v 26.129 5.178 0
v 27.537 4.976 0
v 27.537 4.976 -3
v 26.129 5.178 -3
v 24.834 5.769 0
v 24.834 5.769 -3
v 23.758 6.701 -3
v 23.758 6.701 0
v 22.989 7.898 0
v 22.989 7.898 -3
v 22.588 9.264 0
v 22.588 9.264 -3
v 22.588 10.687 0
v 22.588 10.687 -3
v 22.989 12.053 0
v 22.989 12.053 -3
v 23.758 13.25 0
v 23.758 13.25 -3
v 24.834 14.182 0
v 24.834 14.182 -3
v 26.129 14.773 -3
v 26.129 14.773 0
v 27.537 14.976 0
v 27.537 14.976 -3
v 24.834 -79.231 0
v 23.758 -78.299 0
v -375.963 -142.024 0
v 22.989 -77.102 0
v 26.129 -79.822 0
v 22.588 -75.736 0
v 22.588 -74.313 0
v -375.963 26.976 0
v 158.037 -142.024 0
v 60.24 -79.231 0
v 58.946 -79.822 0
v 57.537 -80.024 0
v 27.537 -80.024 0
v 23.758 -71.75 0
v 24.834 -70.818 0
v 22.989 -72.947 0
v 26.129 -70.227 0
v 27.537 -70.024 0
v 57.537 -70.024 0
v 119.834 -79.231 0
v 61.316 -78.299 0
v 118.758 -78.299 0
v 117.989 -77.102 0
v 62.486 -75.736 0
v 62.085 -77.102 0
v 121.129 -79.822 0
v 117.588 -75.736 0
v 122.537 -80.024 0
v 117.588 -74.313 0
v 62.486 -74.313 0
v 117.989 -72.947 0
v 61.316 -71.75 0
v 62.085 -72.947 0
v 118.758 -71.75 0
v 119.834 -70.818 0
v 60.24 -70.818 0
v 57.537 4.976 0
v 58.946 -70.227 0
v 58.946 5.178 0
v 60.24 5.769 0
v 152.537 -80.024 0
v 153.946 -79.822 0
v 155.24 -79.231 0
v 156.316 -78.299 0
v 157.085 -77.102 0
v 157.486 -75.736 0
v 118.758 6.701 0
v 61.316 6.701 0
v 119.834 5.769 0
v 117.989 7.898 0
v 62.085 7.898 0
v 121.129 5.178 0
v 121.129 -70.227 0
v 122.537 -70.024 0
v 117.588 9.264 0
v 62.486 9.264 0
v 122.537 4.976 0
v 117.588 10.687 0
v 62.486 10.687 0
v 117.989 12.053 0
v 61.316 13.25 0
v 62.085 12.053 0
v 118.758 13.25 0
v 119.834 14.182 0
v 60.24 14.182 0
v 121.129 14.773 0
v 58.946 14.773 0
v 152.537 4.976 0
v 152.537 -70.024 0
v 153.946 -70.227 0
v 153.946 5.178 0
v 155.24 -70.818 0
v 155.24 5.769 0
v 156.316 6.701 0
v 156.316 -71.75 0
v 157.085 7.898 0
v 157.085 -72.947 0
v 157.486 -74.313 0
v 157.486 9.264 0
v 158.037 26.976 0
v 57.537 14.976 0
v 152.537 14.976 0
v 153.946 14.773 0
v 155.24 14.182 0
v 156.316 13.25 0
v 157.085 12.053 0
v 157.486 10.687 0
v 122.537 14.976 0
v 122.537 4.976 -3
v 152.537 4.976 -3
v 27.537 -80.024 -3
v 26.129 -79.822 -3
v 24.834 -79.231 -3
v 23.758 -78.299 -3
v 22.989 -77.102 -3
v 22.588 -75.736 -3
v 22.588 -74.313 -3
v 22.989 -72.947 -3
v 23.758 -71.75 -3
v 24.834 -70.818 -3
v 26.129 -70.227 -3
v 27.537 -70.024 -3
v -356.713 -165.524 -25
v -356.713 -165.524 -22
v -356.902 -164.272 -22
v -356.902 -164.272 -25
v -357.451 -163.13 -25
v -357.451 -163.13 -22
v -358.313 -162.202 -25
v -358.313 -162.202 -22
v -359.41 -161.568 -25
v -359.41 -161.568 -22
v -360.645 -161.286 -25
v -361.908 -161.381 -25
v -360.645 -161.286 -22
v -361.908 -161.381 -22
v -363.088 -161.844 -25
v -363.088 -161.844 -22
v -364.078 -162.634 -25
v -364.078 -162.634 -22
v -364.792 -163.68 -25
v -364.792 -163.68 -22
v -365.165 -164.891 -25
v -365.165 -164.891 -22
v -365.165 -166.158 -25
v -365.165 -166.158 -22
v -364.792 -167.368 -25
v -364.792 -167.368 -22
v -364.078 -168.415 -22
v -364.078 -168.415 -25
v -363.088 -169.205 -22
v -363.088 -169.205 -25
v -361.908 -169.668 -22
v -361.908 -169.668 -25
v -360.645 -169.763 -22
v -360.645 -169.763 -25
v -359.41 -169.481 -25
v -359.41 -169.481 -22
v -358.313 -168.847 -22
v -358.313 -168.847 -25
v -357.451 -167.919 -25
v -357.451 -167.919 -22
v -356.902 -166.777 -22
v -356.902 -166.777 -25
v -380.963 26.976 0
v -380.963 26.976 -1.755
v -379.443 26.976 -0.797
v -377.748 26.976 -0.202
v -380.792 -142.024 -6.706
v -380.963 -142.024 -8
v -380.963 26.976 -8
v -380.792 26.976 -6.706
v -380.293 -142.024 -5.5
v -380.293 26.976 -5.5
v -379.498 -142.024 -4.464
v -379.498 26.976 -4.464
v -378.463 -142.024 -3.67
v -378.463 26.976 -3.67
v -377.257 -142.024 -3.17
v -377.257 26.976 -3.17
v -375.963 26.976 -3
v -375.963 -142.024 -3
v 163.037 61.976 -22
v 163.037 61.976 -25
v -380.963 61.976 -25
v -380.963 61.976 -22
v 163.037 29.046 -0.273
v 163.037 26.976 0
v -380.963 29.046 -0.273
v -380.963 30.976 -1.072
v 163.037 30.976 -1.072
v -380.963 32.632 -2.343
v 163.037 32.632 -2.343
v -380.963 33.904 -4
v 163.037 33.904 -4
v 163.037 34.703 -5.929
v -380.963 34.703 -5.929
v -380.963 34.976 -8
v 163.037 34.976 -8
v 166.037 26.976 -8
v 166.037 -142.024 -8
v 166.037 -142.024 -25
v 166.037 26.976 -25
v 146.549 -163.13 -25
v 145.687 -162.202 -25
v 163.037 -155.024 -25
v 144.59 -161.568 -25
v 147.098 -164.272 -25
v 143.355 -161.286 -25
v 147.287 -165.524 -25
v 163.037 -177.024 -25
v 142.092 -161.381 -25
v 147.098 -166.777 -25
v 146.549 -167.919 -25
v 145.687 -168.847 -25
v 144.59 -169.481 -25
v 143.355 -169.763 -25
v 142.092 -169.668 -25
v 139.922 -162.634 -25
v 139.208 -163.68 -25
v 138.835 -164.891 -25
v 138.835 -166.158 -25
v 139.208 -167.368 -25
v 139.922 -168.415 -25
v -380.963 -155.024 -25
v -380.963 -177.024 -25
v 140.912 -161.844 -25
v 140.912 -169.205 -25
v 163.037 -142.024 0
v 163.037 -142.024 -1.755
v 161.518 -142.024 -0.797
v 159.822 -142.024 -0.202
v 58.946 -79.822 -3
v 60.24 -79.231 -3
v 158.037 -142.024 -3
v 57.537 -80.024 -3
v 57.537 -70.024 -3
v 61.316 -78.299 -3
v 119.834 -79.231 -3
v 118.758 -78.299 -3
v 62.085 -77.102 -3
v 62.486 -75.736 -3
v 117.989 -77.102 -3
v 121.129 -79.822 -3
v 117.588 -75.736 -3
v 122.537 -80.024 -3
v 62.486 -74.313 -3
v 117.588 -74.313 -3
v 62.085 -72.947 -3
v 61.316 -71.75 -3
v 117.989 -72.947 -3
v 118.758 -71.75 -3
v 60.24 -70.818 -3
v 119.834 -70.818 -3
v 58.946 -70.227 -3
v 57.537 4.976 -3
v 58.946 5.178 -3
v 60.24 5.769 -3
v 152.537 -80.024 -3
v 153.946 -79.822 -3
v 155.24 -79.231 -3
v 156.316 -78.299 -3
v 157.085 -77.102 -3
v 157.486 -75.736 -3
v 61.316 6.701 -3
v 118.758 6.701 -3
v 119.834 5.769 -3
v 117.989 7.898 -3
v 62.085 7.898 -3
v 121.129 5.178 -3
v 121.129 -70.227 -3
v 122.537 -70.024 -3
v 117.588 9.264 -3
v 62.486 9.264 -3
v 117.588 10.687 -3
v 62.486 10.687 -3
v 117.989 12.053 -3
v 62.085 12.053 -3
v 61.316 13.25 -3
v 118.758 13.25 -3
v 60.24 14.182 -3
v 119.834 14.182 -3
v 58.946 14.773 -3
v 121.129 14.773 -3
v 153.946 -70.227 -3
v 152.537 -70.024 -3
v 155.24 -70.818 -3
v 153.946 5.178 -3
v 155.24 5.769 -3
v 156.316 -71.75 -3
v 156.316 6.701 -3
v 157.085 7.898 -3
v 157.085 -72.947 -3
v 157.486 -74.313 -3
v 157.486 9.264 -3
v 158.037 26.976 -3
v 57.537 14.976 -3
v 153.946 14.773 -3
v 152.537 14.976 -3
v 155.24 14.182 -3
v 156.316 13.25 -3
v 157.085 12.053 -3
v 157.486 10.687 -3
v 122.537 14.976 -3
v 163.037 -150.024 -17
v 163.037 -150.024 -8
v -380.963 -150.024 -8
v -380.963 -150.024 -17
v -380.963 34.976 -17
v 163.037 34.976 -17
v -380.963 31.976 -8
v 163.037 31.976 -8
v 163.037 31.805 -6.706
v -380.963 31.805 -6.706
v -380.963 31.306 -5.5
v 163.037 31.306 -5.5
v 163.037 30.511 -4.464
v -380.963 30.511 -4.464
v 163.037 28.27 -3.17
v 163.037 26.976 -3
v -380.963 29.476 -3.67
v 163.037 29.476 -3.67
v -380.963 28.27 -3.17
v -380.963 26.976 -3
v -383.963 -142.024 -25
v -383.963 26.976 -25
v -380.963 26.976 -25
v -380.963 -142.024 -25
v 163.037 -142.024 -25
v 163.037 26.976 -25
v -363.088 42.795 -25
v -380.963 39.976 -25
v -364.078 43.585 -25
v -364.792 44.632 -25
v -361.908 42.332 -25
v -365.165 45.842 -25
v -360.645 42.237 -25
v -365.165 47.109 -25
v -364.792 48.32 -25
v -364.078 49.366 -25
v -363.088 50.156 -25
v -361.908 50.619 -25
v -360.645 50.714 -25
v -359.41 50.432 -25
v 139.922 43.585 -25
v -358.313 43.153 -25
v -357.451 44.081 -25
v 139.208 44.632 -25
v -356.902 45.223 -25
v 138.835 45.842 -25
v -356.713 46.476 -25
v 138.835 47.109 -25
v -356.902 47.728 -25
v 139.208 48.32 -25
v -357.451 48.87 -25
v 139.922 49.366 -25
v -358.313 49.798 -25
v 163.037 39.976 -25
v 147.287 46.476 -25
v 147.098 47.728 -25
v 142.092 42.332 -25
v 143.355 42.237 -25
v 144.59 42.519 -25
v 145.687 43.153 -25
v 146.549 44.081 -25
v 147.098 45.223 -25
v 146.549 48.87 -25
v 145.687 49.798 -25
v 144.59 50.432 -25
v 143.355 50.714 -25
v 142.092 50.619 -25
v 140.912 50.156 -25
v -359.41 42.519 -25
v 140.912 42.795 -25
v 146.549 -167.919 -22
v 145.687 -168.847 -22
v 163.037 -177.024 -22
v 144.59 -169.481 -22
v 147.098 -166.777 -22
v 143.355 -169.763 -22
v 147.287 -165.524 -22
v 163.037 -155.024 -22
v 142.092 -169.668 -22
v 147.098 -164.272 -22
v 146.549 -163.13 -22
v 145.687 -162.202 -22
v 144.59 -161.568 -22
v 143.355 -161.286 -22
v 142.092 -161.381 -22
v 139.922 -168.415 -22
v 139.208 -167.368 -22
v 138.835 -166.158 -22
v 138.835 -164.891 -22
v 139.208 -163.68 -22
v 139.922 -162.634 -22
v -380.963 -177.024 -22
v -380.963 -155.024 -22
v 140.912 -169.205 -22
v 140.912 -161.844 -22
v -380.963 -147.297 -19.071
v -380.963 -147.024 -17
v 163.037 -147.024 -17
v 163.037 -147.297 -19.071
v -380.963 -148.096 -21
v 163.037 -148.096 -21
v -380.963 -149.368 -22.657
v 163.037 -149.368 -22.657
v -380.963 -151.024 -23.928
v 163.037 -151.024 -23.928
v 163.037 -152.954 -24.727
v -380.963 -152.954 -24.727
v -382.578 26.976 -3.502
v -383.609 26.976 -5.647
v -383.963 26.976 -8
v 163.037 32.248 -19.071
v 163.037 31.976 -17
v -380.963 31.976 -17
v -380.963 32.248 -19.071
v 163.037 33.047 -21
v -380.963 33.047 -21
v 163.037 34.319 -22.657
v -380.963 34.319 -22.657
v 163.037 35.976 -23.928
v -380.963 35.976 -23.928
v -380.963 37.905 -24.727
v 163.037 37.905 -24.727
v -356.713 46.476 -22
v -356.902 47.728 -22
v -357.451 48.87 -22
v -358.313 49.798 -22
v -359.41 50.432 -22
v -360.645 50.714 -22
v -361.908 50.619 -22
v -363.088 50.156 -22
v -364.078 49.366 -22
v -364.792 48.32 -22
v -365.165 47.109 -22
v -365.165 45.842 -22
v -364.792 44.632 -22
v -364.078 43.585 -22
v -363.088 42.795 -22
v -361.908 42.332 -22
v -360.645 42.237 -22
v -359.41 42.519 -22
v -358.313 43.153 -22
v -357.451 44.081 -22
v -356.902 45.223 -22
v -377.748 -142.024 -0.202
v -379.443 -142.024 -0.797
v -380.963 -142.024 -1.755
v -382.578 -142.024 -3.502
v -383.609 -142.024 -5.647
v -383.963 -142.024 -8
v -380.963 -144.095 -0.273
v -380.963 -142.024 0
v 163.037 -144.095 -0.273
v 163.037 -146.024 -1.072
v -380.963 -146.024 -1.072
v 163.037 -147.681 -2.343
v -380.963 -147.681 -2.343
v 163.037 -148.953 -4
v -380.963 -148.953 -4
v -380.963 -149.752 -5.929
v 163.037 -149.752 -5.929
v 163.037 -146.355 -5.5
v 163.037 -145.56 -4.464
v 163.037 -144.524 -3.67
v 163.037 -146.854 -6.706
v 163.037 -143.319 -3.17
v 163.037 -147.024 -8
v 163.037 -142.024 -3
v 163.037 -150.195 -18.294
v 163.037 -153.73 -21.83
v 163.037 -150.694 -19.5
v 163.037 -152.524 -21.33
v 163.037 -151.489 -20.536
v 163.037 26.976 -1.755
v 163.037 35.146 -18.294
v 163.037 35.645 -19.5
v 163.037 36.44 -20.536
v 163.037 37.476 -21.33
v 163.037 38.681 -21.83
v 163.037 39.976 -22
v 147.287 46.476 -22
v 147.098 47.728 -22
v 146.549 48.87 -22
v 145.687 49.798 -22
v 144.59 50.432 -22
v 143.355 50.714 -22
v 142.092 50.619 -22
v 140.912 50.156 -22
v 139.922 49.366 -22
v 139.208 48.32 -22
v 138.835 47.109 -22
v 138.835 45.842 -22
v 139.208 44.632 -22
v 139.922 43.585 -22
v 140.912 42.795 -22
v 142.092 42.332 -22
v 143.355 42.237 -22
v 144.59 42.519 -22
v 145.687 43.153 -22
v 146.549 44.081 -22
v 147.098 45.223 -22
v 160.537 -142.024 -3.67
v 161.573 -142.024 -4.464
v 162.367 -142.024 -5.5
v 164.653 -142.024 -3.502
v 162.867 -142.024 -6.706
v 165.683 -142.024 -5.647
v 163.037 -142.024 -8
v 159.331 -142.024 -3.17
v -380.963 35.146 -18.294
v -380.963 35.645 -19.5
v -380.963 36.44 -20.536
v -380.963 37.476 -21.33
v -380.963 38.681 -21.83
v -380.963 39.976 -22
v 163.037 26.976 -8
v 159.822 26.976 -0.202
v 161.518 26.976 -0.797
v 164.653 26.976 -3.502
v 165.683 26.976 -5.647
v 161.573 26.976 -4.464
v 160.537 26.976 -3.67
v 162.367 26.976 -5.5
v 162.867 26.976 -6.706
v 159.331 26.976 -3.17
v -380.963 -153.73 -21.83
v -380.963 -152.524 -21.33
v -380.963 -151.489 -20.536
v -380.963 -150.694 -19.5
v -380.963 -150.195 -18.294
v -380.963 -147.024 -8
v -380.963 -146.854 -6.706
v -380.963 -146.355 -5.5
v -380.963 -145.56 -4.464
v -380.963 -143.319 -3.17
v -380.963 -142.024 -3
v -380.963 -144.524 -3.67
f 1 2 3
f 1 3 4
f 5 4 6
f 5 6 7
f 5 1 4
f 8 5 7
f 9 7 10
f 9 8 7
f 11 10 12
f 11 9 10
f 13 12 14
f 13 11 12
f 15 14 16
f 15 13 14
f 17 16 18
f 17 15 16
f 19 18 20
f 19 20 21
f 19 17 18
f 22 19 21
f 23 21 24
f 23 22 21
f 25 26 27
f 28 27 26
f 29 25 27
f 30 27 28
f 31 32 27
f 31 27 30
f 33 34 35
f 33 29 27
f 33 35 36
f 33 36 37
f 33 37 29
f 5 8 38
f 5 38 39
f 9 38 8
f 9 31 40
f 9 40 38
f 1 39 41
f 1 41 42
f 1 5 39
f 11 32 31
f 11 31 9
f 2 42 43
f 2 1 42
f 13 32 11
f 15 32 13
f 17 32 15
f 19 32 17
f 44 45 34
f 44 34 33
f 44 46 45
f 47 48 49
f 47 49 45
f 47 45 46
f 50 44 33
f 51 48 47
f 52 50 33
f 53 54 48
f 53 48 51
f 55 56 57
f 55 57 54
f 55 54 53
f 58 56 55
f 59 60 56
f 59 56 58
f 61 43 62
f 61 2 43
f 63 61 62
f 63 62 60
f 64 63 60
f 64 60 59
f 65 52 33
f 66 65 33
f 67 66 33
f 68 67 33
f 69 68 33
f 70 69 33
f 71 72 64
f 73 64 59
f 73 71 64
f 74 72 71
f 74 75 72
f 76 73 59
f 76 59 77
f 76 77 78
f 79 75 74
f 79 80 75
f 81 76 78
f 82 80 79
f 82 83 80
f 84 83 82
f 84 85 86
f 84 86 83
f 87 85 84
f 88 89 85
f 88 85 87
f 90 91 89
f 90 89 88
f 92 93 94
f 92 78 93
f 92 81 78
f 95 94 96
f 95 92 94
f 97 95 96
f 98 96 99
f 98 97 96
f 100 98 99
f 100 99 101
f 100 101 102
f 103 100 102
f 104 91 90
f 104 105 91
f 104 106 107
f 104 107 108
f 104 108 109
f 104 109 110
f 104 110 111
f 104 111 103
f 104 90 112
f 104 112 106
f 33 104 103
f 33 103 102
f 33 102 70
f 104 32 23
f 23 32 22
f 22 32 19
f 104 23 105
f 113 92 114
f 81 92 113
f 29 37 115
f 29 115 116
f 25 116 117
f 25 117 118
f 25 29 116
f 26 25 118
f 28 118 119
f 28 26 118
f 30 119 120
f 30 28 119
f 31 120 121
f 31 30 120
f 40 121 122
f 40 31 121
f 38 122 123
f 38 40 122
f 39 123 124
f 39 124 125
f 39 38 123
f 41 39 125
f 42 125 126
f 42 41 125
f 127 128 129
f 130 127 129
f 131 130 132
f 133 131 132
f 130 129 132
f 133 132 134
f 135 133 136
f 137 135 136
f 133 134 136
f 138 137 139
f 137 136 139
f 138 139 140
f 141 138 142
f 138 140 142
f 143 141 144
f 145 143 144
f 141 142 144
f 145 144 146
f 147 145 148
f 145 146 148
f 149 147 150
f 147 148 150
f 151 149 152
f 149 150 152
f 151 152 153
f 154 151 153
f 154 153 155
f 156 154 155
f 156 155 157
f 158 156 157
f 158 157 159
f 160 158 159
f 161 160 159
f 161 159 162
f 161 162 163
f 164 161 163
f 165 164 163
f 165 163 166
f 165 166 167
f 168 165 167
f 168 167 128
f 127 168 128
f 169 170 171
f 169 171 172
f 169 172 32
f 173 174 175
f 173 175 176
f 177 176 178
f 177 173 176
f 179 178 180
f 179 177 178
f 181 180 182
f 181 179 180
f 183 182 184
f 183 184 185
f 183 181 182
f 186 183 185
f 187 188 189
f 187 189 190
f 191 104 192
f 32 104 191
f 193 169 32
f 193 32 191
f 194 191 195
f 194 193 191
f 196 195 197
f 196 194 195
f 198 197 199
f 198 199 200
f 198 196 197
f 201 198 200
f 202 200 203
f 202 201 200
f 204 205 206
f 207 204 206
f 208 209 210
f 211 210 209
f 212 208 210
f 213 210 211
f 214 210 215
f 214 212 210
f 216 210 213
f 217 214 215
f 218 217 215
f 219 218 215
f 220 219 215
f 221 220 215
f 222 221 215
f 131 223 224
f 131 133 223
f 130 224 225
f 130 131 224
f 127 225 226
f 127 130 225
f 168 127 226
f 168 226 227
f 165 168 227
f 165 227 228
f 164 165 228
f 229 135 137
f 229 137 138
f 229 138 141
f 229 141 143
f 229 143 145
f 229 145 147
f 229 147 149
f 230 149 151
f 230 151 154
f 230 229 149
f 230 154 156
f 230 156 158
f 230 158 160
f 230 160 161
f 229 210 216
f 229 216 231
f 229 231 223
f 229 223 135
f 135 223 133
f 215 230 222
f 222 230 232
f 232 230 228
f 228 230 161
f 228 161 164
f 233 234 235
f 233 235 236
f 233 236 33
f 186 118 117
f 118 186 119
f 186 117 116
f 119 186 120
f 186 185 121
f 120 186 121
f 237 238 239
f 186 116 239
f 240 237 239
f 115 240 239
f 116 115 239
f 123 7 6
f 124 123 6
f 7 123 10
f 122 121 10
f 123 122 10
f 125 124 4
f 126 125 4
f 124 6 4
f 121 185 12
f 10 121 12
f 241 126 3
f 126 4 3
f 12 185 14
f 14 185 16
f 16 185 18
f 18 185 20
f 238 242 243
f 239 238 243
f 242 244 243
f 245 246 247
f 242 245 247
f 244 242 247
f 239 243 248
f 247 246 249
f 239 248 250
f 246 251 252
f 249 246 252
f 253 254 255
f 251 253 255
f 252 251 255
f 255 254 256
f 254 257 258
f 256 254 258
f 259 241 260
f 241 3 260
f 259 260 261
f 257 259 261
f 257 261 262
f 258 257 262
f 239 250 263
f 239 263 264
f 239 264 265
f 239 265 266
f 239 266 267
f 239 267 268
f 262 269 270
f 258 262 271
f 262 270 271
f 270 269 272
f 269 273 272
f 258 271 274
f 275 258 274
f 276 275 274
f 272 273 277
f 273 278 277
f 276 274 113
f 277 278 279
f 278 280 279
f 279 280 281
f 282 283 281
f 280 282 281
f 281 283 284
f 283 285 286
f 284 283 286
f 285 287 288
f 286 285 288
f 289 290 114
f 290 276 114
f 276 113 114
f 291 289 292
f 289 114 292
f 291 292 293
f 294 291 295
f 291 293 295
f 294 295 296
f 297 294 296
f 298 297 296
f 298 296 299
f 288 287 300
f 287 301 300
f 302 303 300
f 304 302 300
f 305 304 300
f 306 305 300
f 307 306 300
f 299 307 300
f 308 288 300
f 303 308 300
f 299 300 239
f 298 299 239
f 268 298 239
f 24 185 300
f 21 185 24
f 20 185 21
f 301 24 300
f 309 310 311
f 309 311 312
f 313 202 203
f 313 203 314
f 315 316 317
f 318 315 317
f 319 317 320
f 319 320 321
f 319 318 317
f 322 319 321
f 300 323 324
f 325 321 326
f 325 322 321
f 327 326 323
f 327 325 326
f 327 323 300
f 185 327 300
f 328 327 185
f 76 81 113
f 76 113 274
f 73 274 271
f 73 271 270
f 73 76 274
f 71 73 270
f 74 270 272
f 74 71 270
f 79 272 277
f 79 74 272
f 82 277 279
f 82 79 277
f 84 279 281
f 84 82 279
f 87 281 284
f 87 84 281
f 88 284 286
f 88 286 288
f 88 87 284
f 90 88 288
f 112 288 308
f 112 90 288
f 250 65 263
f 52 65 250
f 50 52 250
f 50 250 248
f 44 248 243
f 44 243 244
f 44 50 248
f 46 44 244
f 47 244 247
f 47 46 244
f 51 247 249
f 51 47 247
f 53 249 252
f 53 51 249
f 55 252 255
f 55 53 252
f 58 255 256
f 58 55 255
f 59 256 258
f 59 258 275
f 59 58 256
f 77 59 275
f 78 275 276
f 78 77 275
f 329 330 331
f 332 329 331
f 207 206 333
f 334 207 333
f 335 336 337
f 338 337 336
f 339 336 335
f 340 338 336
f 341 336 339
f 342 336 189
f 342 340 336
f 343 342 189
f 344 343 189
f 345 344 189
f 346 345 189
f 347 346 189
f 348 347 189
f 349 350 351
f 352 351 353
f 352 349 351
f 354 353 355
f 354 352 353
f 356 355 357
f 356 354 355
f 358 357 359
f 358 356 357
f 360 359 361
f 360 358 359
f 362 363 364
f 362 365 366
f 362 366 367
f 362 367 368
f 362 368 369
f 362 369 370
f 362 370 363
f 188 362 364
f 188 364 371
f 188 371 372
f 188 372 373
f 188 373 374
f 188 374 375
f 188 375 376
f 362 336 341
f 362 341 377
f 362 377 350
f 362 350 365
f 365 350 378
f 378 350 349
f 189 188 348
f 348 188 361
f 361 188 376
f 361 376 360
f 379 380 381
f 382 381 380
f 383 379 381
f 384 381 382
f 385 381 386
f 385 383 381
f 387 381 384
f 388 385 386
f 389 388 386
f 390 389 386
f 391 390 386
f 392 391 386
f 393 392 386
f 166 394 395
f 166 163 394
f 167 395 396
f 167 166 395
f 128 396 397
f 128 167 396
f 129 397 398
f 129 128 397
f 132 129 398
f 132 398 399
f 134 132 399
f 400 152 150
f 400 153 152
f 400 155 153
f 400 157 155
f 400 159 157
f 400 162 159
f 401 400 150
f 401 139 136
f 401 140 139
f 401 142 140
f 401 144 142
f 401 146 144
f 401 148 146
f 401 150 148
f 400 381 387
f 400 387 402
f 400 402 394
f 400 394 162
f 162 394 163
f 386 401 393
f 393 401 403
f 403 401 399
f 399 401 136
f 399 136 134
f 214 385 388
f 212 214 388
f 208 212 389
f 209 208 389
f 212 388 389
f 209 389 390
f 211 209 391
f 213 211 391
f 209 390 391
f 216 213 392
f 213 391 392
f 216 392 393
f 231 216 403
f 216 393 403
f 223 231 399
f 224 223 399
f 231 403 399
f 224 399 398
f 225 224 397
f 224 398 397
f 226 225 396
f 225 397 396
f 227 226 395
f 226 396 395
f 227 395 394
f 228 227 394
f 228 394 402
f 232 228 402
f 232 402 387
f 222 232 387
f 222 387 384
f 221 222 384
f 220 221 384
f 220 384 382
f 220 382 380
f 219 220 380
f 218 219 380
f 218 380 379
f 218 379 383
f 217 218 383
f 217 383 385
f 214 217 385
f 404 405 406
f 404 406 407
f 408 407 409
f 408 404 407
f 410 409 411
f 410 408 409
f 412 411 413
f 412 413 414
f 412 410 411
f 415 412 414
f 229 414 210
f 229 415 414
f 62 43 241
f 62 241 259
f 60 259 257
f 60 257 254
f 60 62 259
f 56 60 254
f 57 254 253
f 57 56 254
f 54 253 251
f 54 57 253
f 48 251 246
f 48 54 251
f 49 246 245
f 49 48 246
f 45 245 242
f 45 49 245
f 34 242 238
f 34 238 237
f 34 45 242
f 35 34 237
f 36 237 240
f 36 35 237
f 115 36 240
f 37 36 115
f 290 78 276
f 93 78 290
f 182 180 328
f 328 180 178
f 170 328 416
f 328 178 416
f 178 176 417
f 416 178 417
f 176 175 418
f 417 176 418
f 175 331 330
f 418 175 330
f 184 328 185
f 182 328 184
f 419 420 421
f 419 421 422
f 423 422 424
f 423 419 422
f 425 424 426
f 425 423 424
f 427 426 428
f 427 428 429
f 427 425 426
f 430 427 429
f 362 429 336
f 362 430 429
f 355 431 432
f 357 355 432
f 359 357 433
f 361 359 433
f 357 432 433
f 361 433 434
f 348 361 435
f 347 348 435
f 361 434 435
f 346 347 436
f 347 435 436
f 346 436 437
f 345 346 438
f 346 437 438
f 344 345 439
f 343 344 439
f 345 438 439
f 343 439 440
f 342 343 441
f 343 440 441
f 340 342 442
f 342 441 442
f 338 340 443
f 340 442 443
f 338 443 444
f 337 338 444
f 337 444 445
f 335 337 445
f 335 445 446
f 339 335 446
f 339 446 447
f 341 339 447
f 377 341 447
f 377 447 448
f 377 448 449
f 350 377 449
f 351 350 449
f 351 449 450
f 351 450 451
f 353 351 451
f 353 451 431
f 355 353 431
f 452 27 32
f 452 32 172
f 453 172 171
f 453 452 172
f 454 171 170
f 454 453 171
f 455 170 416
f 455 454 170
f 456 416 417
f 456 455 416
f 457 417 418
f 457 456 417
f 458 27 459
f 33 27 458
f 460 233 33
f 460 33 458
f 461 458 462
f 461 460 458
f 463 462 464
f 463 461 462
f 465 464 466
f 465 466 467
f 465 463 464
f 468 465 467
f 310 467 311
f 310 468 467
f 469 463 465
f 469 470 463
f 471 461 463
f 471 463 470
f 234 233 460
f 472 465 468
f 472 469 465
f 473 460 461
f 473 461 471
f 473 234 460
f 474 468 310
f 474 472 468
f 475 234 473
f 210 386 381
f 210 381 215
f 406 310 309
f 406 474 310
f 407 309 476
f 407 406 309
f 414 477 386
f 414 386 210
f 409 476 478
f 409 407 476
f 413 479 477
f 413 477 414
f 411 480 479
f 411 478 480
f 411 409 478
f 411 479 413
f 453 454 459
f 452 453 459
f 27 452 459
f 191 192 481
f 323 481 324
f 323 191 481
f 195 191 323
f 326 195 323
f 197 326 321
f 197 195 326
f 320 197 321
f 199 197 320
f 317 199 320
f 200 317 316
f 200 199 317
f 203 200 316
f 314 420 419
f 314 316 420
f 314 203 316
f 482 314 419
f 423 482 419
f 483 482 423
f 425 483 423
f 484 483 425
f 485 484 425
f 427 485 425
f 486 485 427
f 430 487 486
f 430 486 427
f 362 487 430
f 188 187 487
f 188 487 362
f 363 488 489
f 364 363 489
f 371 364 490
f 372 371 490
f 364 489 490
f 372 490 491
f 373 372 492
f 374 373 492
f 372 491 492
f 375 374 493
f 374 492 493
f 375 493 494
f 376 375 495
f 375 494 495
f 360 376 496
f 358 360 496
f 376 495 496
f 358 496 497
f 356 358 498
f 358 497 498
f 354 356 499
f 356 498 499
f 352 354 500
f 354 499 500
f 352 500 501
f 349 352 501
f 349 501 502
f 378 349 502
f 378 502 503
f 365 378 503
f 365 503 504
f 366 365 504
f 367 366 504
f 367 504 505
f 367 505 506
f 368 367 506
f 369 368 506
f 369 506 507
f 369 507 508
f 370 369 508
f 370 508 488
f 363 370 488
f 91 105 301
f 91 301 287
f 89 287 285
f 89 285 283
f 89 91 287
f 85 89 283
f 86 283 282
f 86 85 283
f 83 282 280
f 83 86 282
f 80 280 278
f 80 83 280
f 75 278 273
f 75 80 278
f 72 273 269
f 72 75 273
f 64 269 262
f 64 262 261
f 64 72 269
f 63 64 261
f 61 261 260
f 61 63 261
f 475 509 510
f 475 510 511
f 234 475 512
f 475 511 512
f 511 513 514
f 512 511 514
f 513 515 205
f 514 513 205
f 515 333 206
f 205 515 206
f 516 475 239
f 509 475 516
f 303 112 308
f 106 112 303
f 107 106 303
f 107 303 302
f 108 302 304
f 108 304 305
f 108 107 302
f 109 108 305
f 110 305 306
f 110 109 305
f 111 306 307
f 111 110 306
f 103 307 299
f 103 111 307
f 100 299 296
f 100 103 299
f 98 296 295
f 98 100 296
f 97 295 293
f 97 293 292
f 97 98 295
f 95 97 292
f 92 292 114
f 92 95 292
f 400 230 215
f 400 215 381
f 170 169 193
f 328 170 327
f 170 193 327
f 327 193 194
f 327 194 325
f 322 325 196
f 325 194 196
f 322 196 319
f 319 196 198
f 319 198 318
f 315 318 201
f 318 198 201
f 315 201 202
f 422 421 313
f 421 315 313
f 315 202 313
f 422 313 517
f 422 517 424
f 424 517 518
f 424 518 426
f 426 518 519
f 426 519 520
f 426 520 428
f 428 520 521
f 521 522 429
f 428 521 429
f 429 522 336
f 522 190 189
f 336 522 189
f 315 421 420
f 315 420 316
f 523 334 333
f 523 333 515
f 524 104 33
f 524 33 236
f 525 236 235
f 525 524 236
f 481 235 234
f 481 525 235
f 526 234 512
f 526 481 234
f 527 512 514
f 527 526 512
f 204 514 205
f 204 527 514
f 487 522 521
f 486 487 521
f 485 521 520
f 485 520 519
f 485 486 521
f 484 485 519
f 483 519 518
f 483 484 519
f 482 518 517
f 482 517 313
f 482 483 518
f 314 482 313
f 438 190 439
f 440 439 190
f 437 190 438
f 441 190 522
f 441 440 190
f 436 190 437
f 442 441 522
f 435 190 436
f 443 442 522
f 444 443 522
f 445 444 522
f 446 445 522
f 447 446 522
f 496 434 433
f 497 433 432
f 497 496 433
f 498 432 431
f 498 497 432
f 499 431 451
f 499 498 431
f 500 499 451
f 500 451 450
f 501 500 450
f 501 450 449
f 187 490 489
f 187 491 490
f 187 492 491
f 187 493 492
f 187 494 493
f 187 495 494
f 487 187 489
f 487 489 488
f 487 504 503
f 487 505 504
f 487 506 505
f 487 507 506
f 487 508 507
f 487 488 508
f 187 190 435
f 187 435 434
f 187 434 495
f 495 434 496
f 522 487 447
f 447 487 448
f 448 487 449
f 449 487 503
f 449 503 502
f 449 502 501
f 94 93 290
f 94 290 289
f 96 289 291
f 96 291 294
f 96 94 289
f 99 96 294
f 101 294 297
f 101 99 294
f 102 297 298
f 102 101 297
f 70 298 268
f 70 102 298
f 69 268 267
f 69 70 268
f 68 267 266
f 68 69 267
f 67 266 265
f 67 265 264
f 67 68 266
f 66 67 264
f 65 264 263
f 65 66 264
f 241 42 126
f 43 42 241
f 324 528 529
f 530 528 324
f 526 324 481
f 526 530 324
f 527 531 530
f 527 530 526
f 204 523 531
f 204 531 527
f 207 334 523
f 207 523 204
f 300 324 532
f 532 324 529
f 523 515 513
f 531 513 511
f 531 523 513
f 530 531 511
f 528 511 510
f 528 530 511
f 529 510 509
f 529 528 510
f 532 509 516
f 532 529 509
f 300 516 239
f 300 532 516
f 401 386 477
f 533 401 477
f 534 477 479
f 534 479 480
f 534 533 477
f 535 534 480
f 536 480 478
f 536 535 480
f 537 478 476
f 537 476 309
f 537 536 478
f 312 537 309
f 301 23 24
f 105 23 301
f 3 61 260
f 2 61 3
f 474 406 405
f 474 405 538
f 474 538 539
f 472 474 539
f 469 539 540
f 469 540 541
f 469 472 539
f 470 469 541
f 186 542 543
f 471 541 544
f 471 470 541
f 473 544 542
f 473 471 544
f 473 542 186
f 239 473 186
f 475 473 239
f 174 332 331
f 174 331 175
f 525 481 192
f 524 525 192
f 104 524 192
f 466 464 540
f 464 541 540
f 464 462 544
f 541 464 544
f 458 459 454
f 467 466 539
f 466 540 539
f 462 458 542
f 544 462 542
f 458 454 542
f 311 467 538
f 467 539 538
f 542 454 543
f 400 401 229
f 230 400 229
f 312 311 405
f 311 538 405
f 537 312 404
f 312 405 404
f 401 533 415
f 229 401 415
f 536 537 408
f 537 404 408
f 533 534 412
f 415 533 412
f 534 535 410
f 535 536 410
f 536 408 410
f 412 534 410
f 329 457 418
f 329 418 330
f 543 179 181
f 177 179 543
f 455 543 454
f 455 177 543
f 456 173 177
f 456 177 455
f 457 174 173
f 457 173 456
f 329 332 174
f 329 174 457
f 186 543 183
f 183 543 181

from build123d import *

# Parameters (mm, degrees)
SKETCH1_W                    = 544
SKETCH1_H                    = 185
BASE_FLANGE1_DEPTH           = 3
EDGE_FLANGE1_STRIP_W         = 22
EDGE_FLANGE1_STRIP_H         = 3
EDGE_FLANGE1_STRIP_CUT_DEPTH = 544
EDGE_FLANGE1_DEPTH           = 544
EDGE_FLANGE2_STRIP_W         = 22
EDGE_FLANGE2_STRIP_H         = 3
EDGE_FLANGE2_STRIP_CUT_DEPTH = 544
EDGE_FLANGE2_DEPTH           = 544
EDGE_FLANGE3_STRIP_W         = 22
EDGE_FLANGE3_STRIP_H         = 3
EDGE_FLANGE3_STRIP_CUT_DEPTH = 544
EDGE_FLANGE3_DEPTH           = 544
EDGE_FLANGE4_STRIP_W         = 22
EDGE_FLANGE4_STRIP_H         = 3
EDGE_FLANGE4_STRIP_CUT_DEPTH = 544
EDGE_FLANGE4_DEPTH           = 544
EDGE_FLANGE5_STRIP_W         = 22
EDGE_FLANGE5_STRIP_H         = 3
EDGE_FLANGE5_STRIP_CUT_DEPTH = 169
EDGE_FLANGE5_DEPTH           = 169
EDGE_FLANGE6_STRIP_W         = 22
EDGE_FLANGE6_STRIP_H         = 3
EDGE_FLANGE6_STRIP_CUT_DEPTH = 169
EDGE_FLANGE6_DEPTH           = 169
SKETCH26_R                   = 4.25
CUT_EXTRUDE1_DEPTH           = 10
SKETCH27_R                   = 4.25
CUT_EXTRUDE2_DEPTH           = 10


# Sheet-metal steps are written as plain solids
with BuildPart() as part:
    # Sketch1 → Base-Flange1 (new body)
    with BuildSketch(Plane.XY):
        with Locations((-108.962758621, -57.524490421)):
            Rectangle(SKETCH1_W, SKETCH1_H)
        with BuildLine():
            Line((152.537241379, 4.975509579), (122.537241379, 4.975509579))
            ThreePointArc((122.537241379, 4.975509579), (117.537241379, 9.975509579), (122.537241379, 14.975509579))
            Line((122.537241379, 14.975509579), (152.537241379, 14.975509579))
            ThreePointArc((152.537241379, 14.975509579), (157.537241379, 9.975509579), (152.537241379, 4.975509579))
        make_face(mode=Mode.SUBTRACT)
        with BuildLine():
            Line((57.537241379, 4.975509579), (27.537241379, 4.975509579))
            ThreePointArc((27.537241379, 4.975509579), (22.537241379, 9.975509579), (27.537241379, 14.975509579))
            Line((27.537241379, 14.975509579), (57.537241379, 14.975509579))
            ThreePointArc((57.537241379, 14.975509579), (62.537241379, 9.975509579), (57.537241379, 4.975509579))
        make_face(mode=Mode.SUBTRACT)
        with BuildLine():
            Line((152.537241379, -80.024490421), (122.537241379, -80.024490421))
            ThreePointArc((122.537241379, -80.024490421), (117.537241379, -75.024490421), (122.537241379, -70.024490421))
            Line((122.537241379, -70.024490421), (152.537241379, -70.024490421))
            ThreePointArc((152.537241379, -70.024490421), (157.537241379, -75.024490421), (152.537241379, -80.024490421))
        make_face(mode=Mode.SUBTRACT)
        with BuildLine():
            Line((57.537241379, -80.024490421), (27.537241379, -80.024490421))
            ThreePointArc((27.537241379, -80.024490421), (22.537241379, -75.024490421), (27.537241379, -70.024490421))
            Line((27.537241379, -70.024490421), (57.537241379, -70.024490421))
            ThreePointArc((57.537241379, -70.024490421), (62.537241379, -75.024490421), (57.537241379, -80.024490421))
        make_face(mode=Mode.SUBTRACT)
    extrude(amount=-BASE_FLANGE1_DEPTH)

    # Edge-Flange1 strip (across the edge) → Edge-Flange1 strip cut (cut)
    with BuildSketch(Plane(origin=(-380.962758621, 34.975509579, -3), x_dir=(0, -1, 0), z_dir=(1, 0, 0))):
        with Locations((-3, -1.5)):
            Rectangle(EDGE_FLANGE1_STRIP_W, EDGE_FLANGE1_STRIP_H)
    extrude(amount=EDGE_FLANGE1_STRIP_CUT_DEPTH, mode=Mode.SUBTRACT)

    # Edge-Flange1 section (across the edge) → Edge-Flange1 (add)
    with BuildSketch(Plane(origin=(-380.962758621, 34.975509579, -3), x_dir=(0, -1, 0), z_dir=(1, 0, 0))):
        with BuildLine():
            Line((0, 5), (0, 22))
            Line((0, 22), (3, 22))
            Line((3, 22), (3, 5))
            ThreePointArc((3, 5), (4.464466094, 1.464466094), (8, 0))
            Line((8, 0), (8, -3))
            ThreePointArc((8, -3), (2.343145751, -0.656854249), (0, 5))
        make_face()
    extrude(amount=EDGE_FLANGE1_DEPTH)

    # Edge-Flange2 strip (across the edge) → Edge-Flange2 strip cut (cut)
    with BuildSketch(Plane(origin=(163.037241379, -150.024490421, -3), x_dir=(0, 1, 0), z_dir=(-1, 0, 0))):
        with Locations((-3, -1.5)):
            Rectangle(EDGE_FLANGE2_STRIP_W, EDGE_FLANGE2_STRIP_H)
    extrude(amount=EDGE_FLANGE2_STRIP_CUT_DEPTH, mode=Mode.SUBTRACT)

    # Edge-Flange2 section (across the edge) → Edge-Flange2 (add)
    with BuildSketch(Plane(origin=(163.037241379, -150.024490421, -3), x_dir=(0, 1, 0), z_dir=(-1, 0, 0))):
        with BuildLine():
            Line((0, 5), (0, 22))
            Line((0, 22), (3, 22))
            Line((3, 22), (3, 5))
            ThreePointArc((3, 5), (4.464466094, 1.464466094), (8, 0))
            Line((8, 0), (8, -3))
            ThreePointArc((8, -3), (2.343145751, -0.656854249), (0, 5))
        make_face()
    extrude(amount=EDGE_FLANGE2_DEPTH)

    # Edge-Flange3 strip (across the edge) → Edge-Flange3 strip cut (cut)
    with BuildSketch(Plane(origin=(-380.962758621, -150.024490421, -25), x_dir=(0, 0, 1), z_dir=(1, 0, 0))):
        with Locations((-3, -1.5)):
            Rectangle(EDGE_FLANGE3_STRIP_W, EDGE_FLANGE3_STRIP_H)
    extrude(amount=EDGE_FLANGE3_STRIP_CUT_DEPTH, mode=Mode.SUBTRACT)

    # Edge-Flange3 section (across the edge) → Edge-Flange3 (add)
    with BuildSketch(Plane(origin=(-380.962758621, -150.024490421, -25), x_dir=(0, 0, 1), z_dir=(1, 0, 0))):
        with BuildLine():
            Line((0, 5), (0, 27))
            Line((0, 27), (3, 27))
            Line((3, 27), (3, 5))
            ThreePointArc((3, 5), (4.464466094, 1.464466094), (8, 0))
            Line((8, 0), (8, -3))
            ThreePointArc((8, -3), (2.343145751, -0.656854249), (0, 5))
        make_face()
    extrude(amount=EDGE_FLANGE3_DEPTH)

    # Edge-Flange4 strip (across the edge) → Edge-Flange4 strip cut (cut)
    with BuildSketch(Plane(origin=(163.037241379, 34.975509579, -25), x_dir=(0, 0, 1), z_dir=(-1, 0, 0))):
        with Locations((-3, -1.5)):
            Rectangle(EDGE_FLANGE4_STRIP_W, EDGE_FLANGE4_STRIP_H)
    extrude(amount=EDGE_FLANGE4_STRIP_CUT_DEPTH, mode=Mode.SUBTRACT)

    # Edge-Flange4 section (across the edge) → Edge-Flange4 (add)
    with BuildSketch(Plane(origin=(163.037241379, 34.975509579, -25), x_dir=(0, 0, 1), z_dir=(-1, 0, 0))):
        with BuildLine():
            Line((0, 5), (0, 27))
            Line((0, 27), (3, 27))
            Line((3, 27), (3, 5))
            ThreePointArc((3, 5), (4.464466094, 1.464466094), (8, 0))
            Line((8, 0), (8, -3))
            ThreePointArc((8, -3), (2.343145751, -0.656854249), (0, 5))
        make_face()
    extrude(amount=EDGE_FLANGE4_DEPTH)

    # Edge-Flange5 strip (across the edge) → Edge-Flange5 strip cut (cut)
    with BuildSketch(Plane(origin=(163.037241379, 26.975509579, -3), x_dir=(-1, 0, 0), z_dir=(0, -1, 0))):
        with Locations((-6, -1.5)):
            Rectangle(EDGE_FLANGE5_STRIP_W, EDGE_FLANGE5_STRIP_H)
    extrude(amount=EDGE_FLANGE5_STRIP_CUT_DEPTH, mode=Mode.SUBTRACT)

    # Edge-Flange5 section (across the edge) → Edge-Flange5 (add)
    with BuildSketch(Plane(origin=(163.037241379, 26.975509579, -3), x_dir=(-1, 0, 0), z_dir=(0, -1, 0))):
        with BuildLine():
            Line((-3, 5), (-3, 22))
            Line((-3, 22), (0, 22))
            Line((0, 22), (0, 5))
            ThreePointArc((0, 5), (1.464466094, 1.464466094), (5, 0))
            Line((5, 0), (5, -3))
            ThreePointArc((5, -3), (-0.656854249, -0.656854249), (-3, 5))
        make_face()
    extrude(amount=EDGE_FLANGE5_DEPTH)

    # Edge-Flange6 strip (across the edge) → Edge-Flange6 strip cut (cut)
    with BuildSketch(Plane(origin=(-380.962758621, -142.024490421, -3), x_dir=(1, 0, 0), z_dir=(0, 1, 0))):
        with Locations((-6, -1.5)):
            Rectangle(EDGE_FLANGE6_STRIP_W, EDGE_FLANGE6_STRIP_H)
    extrude(amount=EDGE_FLANGE6_STRIP_CUT_DEPTH, mode=Mode.SUBTRACT)

    # Edge-Flange6 section (across the edge) → Edge-Flange6 (add)
    with BuildSketch(Plane(origin=(-380.962758621, -142.024490421, -3), x_dir=(1, 0, 0), z_dir=(0, 1, 0))):
        with BuildLine():
            Line((-3, 5), (-3, 22))
            Line((-3, 22), (0, 22))
            Line((0, 22), (0, 5))
            ThreePointArc((0, 5), (1.464466094, 1.464466094), (5, 0))
            Line((5, 0), (5, -3))
            ThreePointArc((5, -3), (-0.656854249, -0.656854249), (-3, 5))
        make_face()
    extrude(amount=EDGE_FLANGE6_DEPTH)

    # Sketch26 → Cut-Extrude1 (cut)
    with BuildSketch(Plane.XY.offset(-22)):
        with Locations((143.037241379, -165.524490421)):
            Circle(SKETCH26_R)
        with Locations((-360.962758621, -165.524490421)):
            Circle(SKETCH26_R)
    extrude(amount=-CUT_EXTRUDE1_DEPTH, mode=Mode.SUBTRACT)

    # Sketch27 → Cut-Extrude2 (cut)
    with BuildSketch(Plane.XY.offset(-22)):
        with Locations((143.037241379, 46.475509579)):
            Circle(SKETCH27_R)
        with Locations((-360.962758621, 46.475509579)):
            Circle(SKETCH27_R)
    extrude(amount=-CUT_EXTRUDE2_DEPTH, mode=Mode.SUBTRACT)


solid = part.part
